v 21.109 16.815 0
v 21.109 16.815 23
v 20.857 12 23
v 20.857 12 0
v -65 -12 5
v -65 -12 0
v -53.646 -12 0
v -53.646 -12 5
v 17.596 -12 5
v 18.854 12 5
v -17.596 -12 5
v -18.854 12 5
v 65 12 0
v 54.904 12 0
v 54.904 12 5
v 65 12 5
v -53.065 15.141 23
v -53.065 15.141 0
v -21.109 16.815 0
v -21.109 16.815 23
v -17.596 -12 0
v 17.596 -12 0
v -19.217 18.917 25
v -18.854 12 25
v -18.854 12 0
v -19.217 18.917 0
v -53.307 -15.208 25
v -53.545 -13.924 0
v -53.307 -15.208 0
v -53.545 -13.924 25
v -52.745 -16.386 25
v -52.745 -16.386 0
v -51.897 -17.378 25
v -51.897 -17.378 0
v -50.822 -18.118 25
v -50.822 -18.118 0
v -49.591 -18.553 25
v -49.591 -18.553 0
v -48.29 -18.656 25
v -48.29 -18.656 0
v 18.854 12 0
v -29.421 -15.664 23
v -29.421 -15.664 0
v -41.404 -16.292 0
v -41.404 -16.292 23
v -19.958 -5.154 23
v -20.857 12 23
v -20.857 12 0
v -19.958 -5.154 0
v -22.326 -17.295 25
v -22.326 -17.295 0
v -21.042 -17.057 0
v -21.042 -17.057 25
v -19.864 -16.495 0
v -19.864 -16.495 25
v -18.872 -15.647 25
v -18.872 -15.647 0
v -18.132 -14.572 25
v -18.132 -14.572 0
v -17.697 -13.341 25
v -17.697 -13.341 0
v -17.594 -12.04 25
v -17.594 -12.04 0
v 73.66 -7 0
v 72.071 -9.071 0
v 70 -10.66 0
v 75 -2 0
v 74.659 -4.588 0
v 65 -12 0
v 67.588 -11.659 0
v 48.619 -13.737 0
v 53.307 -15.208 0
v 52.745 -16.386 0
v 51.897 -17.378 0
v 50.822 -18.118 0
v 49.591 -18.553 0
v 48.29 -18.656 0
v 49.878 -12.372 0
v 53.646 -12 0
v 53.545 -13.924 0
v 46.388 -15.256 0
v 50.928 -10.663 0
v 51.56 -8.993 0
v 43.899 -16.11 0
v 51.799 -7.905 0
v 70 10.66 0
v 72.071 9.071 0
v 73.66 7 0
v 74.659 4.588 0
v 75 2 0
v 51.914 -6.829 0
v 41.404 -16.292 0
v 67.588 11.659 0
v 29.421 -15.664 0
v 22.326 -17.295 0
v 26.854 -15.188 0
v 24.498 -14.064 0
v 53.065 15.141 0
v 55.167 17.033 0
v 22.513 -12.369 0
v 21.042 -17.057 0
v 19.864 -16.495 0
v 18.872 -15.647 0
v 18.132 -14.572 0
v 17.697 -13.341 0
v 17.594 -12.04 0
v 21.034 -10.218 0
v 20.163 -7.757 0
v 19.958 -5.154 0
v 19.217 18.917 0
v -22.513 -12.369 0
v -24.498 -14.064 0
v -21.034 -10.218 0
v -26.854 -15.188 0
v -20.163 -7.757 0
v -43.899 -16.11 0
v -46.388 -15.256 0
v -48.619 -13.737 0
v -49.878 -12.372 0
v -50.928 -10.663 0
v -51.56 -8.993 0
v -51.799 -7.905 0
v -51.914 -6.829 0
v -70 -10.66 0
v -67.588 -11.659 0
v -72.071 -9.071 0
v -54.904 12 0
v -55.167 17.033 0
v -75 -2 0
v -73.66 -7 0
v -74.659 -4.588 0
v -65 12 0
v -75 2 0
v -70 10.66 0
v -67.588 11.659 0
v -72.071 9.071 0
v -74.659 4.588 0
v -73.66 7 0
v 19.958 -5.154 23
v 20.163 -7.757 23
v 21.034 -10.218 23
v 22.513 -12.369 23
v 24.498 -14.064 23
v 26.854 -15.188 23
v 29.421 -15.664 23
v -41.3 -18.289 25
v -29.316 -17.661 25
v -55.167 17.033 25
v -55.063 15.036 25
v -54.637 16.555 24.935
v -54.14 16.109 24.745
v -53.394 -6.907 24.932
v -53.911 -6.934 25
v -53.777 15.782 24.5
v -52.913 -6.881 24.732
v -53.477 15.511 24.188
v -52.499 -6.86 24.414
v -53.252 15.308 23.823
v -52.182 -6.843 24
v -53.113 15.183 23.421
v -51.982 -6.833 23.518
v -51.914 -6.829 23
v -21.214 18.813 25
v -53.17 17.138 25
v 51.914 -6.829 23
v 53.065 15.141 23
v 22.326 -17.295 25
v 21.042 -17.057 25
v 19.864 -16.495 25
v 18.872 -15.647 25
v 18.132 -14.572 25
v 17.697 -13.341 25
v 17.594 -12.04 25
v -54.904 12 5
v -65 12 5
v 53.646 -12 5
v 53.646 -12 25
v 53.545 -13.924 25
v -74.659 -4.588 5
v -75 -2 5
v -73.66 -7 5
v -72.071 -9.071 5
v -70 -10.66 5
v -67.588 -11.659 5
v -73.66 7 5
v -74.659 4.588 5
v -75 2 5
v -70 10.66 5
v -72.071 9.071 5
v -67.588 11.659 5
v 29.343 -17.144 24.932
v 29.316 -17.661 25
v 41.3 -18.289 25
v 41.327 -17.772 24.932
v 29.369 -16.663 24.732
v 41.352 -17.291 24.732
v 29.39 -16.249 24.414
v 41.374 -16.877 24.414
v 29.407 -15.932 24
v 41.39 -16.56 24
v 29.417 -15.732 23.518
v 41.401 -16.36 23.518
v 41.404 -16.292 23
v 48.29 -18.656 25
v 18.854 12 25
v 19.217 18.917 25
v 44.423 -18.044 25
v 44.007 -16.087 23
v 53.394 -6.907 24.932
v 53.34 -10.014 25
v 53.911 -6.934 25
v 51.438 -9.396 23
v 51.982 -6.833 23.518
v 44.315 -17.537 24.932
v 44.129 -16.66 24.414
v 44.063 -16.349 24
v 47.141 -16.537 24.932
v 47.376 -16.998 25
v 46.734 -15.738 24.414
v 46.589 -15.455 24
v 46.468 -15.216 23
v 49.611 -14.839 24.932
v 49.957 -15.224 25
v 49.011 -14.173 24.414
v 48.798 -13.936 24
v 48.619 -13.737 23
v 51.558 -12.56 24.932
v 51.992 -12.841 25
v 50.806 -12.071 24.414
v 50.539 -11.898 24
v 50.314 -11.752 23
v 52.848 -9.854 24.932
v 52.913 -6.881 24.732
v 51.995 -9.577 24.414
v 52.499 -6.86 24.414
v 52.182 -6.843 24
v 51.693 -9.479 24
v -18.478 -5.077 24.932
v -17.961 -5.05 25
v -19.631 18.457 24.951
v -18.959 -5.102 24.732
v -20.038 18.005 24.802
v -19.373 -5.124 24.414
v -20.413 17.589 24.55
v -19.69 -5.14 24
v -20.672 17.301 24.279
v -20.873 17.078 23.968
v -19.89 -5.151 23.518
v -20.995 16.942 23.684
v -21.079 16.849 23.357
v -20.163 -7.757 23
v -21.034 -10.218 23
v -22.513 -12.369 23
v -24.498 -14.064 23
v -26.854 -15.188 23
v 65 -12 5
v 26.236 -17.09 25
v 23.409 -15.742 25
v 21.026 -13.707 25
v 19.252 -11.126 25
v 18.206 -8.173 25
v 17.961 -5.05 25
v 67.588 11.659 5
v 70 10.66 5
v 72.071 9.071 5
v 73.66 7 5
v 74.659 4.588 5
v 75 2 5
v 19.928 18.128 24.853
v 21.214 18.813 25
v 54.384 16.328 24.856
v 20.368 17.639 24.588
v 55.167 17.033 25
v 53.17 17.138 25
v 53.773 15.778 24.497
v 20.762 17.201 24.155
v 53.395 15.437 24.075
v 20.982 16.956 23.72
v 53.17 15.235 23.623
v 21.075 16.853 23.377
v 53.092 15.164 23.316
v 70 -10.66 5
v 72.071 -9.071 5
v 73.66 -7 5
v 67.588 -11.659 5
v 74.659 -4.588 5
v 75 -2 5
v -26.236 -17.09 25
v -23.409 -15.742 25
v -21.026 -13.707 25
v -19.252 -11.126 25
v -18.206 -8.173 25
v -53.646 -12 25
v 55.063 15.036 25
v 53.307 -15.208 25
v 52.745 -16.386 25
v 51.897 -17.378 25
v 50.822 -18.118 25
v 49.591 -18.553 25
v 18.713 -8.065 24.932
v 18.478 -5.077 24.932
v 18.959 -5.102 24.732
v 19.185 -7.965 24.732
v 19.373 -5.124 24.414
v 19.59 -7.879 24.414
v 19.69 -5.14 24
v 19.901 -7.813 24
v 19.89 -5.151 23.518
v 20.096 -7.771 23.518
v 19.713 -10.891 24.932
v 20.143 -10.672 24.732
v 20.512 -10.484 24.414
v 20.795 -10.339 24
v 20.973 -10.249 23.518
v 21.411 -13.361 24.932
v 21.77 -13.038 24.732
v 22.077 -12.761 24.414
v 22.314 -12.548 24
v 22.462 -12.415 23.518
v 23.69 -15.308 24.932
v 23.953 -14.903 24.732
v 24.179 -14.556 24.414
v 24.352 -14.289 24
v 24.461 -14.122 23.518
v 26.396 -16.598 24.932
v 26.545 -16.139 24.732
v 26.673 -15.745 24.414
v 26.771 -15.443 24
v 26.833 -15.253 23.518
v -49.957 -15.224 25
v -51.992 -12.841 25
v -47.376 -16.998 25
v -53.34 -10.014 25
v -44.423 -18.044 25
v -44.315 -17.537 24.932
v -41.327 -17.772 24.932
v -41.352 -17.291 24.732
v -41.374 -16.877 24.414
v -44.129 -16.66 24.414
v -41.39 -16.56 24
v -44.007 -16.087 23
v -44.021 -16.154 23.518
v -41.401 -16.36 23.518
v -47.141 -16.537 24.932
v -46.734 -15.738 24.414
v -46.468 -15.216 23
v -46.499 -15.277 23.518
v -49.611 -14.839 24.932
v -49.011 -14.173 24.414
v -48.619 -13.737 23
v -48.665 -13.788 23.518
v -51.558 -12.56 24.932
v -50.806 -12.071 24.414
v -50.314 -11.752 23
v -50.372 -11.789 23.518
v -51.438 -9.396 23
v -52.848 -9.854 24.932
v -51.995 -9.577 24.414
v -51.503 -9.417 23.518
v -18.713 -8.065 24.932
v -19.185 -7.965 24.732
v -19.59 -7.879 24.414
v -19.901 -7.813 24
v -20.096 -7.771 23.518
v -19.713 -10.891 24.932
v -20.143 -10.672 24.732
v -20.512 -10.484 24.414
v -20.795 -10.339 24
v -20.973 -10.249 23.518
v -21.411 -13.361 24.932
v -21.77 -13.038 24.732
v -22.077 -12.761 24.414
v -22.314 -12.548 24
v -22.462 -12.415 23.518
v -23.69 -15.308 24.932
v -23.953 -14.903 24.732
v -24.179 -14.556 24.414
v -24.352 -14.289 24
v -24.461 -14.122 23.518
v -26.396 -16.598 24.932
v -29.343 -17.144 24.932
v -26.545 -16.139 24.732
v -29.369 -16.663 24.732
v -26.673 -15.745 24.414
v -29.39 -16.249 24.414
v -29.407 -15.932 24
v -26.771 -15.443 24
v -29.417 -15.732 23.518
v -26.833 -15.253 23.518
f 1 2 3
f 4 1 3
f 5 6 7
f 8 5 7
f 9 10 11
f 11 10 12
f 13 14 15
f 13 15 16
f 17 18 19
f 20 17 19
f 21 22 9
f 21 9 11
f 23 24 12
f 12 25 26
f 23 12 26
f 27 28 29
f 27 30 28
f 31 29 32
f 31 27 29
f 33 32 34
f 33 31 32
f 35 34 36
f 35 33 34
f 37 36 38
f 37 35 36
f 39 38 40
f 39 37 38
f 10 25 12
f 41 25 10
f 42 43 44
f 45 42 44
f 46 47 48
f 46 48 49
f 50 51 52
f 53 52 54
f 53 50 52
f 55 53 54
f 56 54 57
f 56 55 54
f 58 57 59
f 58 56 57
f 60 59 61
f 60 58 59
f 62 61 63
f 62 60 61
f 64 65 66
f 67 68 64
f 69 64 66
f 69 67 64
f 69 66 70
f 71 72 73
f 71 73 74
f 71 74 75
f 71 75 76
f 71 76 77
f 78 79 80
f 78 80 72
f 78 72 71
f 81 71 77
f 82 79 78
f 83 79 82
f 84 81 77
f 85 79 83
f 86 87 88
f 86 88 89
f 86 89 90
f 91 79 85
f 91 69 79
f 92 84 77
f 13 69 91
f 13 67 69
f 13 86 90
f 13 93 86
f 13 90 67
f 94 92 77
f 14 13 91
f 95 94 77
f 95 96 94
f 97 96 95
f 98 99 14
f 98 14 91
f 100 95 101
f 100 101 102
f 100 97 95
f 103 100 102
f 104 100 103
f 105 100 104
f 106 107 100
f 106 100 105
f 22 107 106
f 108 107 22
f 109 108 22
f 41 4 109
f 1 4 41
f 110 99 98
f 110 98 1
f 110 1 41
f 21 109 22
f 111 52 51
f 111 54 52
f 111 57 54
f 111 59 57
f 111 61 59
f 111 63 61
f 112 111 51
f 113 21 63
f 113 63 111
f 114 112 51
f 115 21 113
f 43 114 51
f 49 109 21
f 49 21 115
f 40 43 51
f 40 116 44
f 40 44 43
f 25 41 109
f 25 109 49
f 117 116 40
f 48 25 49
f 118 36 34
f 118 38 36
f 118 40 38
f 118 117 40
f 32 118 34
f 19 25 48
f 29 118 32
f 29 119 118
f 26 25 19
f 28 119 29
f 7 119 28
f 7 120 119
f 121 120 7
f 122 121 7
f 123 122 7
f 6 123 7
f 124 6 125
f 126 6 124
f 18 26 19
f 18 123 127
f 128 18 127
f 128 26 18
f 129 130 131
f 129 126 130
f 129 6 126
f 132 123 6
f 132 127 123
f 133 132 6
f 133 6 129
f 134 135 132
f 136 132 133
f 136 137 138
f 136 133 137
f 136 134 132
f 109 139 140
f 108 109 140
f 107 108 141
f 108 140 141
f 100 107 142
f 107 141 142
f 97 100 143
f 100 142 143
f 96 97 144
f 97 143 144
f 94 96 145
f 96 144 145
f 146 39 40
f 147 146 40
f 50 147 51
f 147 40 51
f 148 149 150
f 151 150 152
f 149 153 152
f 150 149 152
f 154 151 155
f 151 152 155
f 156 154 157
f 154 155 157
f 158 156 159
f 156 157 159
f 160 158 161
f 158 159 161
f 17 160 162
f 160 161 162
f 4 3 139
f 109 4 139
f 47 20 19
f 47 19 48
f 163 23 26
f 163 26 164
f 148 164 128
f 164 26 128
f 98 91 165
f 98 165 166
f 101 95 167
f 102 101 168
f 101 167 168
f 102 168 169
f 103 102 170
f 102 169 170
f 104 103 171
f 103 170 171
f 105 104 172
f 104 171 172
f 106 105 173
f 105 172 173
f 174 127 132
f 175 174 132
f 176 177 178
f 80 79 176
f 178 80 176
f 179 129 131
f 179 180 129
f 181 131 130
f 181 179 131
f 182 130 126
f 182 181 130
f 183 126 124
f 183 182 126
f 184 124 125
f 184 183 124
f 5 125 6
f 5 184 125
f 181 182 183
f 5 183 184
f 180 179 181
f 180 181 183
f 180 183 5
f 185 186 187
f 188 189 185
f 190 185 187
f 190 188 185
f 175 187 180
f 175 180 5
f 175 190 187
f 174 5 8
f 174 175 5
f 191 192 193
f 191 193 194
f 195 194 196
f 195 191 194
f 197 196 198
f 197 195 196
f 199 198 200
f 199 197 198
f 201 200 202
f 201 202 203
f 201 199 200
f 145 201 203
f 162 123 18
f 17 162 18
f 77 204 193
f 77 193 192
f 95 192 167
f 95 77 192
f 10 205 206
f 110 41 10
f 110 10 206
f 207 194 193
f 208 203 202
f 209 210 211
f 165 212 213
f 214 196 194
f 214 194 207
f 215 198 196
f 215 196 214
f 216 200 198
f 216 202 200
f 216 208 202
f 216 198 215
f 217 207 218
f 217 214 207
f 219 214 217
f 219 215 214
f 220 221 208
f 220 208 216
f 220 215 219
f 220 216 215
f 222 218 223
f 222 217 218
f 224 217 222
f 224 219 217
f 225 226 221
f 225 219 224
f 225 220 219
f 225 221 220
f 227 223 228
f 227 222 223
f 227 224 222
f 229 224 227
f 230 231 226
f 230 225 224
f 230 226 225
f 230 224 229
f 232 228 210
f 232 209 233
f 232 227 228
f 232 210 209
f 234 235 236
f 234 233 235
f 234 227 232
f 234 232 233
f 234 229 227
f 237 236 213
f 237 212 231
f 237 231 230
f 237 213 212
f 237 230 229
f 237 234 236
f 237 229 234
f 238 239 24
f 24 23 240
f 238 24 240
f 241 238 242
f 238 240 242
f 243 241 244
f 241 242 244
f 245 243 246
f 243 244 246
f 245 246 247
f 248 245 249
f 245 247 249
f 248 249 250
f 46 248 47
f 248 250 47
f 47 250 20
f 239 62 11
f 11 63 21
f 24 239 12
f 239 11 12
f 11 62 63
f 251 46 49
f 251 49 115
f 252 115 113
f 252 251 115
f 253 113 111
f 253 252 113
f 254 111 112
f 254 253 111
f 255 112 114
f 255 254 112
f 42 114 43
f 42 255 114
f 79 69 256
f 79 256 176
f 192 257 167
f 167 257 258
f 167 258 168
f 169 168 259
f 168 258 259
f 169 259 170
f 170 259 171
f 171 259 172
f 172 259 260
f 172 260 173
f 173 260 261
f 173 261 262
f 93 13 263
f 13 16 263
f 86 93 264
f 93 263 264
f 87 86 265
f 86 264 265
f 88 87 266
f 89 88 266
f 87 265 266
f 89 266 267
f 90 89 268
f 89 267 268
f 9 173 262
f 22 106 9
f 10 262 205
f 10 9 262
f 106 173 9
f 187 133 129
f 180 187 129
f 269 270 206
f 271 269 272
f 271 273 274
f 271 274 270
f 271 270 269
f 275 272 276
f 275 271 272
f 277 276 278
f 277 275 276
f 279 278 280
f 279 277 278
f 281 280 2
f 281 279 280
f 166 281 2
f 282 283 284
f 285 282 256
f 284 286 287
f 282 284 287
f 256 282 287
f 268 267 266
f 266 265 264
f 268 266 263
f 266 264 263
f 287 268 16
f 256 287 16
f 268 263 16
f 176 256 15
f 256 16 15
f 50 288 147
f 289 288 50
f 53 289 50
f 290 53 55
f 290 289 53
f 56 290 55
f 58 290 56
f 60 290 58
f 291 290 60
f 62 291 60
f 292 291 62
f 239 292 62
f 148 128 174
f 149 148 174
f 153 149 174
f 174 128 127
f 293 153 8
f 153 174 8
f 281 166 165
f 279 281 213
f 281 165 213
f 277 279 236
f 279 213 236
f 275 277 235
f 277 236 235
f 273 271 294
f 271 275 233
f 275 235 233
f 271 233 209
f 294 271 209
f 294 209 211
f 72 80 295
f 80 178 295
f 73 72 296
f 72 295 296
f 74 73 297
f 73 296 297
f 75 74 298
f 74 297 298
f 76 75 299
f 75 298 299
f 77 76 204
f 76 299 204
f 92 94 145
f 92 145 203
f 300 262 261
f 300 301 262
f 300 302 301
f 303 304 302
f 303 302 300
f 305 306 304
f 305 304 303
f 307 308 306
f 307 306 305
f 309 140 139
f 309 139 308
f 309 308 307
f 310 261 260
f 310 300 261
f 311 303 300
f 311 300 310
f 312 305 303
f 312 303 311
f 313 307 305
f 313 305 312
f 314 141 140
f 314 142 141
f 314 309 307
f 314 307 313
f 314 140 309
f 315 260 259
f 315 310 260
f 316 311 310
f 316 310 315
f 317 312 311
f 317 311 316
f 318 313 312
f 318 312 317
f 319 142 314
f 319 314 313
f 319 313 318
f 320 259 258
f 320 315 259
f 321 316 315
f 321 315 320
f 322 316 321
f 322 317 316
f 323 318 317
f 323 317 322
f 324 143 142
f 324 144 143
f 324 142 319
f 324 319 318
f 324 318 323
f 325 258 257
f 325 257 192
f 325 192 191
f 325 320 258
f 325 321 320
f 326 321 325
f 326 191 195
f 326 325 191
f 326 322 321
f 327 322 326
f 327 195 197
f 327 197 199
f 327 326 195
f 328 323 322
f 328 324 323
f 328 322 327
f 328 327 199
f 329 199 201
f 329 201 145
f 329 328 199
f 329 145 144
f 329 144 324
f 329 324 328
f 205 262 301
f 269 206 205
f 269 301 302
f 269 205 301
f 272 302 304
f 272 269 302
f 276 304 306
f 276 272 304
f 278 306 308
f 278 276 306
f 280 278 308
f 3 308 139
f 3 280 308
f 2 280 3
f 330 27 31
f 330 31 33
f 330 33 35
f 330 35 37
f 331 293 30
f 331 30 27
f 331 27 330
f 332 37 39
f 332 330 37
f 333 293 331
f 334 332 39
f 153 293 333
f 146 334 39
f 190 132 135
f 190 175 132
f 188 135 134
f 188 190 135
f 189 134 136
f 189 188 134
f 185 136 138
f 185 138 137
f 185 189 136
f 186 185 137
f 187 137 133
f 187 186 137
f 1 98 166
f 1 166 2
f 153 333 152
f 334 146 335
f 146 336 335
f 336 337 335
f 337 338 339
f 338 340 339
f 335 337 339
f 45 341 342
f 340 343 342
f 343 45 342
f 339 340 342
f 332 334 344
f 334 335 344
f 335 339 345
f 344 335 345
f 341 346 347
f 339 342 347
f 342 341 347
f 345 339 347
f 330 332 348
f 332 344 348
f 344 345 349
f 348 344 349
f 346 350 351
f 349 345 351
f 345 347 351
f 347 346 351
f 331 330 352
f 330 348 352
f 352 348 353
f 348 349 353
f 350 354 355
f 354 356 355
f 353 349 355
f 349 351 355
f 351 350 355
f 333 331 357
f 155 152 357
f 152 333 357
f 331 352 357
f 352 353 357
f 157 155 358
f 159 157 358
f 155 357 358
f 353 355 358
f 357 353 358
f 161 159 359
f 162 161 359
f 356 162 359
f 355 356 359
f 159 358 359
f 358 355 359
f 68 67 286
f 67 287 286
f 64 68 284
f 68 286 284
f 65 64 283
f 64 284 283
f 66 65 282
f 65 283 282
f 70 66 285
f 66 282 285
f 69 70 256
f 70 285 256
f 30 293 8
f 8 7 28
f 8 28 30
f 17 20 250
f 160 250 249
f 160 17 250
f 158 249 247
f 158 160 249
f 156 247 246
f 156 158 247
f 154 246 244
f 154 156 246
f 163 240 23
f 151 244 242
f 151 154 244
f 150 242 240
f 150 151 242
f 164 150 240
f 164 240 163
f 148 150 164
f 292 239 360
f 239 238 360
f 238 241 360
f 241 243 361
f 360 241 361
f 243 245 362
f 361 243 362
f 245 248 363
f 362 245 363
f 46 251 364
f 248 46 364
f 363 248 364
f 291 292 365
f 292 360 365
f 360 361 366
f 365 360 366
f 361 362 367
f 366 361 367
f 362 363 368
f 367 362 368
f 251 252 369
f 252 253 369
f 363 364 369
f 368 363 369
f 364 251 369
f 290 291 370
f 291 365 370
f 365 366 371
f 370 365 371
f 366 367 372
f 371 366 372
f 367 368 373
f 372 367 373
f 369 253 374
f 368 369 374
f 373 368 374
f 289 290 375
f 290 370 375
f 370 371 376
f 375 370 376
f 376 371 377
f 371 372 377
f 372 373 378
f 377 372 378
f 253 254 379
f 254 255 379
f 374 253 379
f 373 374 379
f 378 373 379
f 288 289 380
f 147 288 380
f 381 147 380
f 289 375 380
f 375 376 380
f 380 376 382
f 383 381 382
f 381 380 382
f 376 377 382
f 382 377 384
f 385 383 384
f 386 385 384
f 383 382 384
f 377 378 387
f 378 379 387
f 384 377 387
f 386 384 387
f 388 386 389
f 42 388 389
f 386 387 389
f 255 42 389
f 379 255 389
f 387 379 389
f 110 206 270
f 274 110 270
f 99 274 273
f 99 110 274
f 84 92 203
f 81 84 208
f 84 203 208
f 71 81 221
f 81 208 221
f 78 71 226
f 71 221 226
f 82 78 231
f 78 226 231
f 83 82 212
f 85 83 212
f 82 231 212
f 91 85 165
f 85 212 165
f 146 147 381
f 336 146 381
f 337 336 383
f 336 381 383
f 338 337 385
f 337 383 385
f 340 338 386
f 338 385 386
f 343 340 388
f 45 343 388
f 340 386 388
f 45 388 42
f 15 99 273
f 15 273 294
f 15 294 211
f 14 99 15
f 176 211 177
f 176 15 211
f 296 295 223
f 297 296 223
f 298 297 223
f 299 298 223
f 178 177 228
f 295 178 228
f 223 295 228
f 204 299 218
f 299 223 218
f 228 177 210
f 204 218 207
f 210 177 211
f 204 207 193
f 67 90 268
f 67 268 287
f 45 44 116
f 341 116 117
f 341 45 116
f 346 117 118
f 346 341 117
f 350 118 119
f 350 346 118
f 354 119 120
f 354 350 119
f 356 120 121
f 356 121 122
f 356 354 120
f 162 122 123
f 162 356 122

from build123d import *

# Parameters (mm, degrees)
F1_DEPTH     = 25
F2_DEPTH     = 5
F3_R         = 10
F4_R         = 5
F6_T1_DEPTH  = 22
F6_T3_DEPTH  = 32
F6_T5_DEPTH  = 32
F6_T7_DEPTH  = 22
F6_T9_DEPTH  = 22
F6_T11_DEPTH = 12
F6_T13_DEPTH = 22
F6_T15_DEPTH = 12
F6_T18_ANGLE = 90
F6_T20_ANGLE = 90
F6_T22_ANGLE = 90
F6_T24_ANGLE = 90
F6_T29_DEPTH = 37
F6_T34_DEPTH = 27
F6_T42_DEPTH = 37
F6_T47_DEPTH = 27
F6_T55_DEPTH = 27
F6_T60_DEPTH = 37
F6_T68_DEPTH = 27
F6_T73_DEPTH = 37


# Not quite as in the source:
# - a fillet or chamfer that OpenCascade refuses, or shapes differently, is made with other operations: its cross-section is extruded or revolved along the edge and cut away or added
# - a feature names something its author has since deleted; it is built from what else it names


with BuildPart() as f1:
    # F0 (on Top) → F1 (new body)
    with BuildSketch(Plane.XY):
        Polygon((-52.9008508874, 12), (-53.065447856, 15.1406972562), (-21.1093027438, 16.815447856), (-20.8569358154, 12), (-18.8541911234, 12), (-19.2167155868, 18.917378838), (-55.167378838, 17.0332844132), (-54.9035955794, 12), align=None)
        Polygon((-51.6430641846, -12), (-52.9008508874, 12), (-54.9035955794, 12), (-53.6458088766, -12), align=None)
        Polygon((-18.8541911234, 12), (-20.8569358154, 12), (-19.5991491126, -12), (-17.5964044206, -12), align=None)
        Polygon((-51.3906972562, -16.815447856), (-51.6430641846, -12), (-53.6458088766, -12), (-53.2832844132, -18.917378838), (-17.332621162, -17.0332844132), (-17.5964044206, -12), (-19.5991491126, -12), (-19.434552144, -15.1406972562), align=None)
    extrude(amount=F1_DEPTH)

    # F0 (on Top) → F2 (join)
    with BuildSketch(Plane.XY):
        Polygon((-53.6458088766, -12), (-54.9035955794, 12), (-75, 12), (-75, -12), align=None)
        Polygon((0, 12), (-18.8541911234, 12), (-17.5964044206, -12), (0, -12), align=None)
    extrude(amount=F2_DEPTH)

    # F3
    f3_edges = [f1.edges().sort_by_distance(p)[0] for p in [
        (-75, -12, 2.5),
        (-75, 12, 2.5),
        (-51.390697, -16.815448, 12.5),
        (-19.434552, -15.140697, 12.5),
    ]]
    fillet(f3_edges, radius=F3_R)

    # F4
    f4_edges = [f1.edges().sort_by_distance(p)[0] for p in [
        (-53.283284, -18.917379, 12.5),
        (-17.332621, -17.033284, 12.5),
    ]]
    fillet(f4_edges, radius=F4_R)

    # F5: F1 across plane


with BuildPart() as f1_1:
    add(f1.part)
    add(f1.part.mirror(Plane.YZ))

    # F6: fillet of radius 2 on 12 edges, made by hand

    # F6_s2 → F6_t1 (cut)
    with BuildSketch(Plane(origin=(0.214725091, -4.0971988118, 0), x_dir=(0, 0, 1), z_dir=(-0.0523359562, 0.9986295348, 0))):
        with BuildLine():
            ThreePointArc((25, -54.2003206349), (24.4142135624, -52.7861070725), (23, -52.2003206349))
            Line((23, -52.2003206349), (25, -52.2003206349))
            Line((25, -52.2003206349), (25, -54.2003206349))
        make_face()
    extrude(amount=F6_T1_DEPTH, mode=Mode.SUBTRACT)

    # F6_s4 → F6_t3 (cut)
    with BuildSketch(Plane(origin=(-52.1287819096, -2.7319536966, 0), x_dir=(0, 0, 1), z_dir=(0.9986295348, 0.0523359562, 0))):
        with BuildLine():
            ThreePointArc((23, -17.8971784138), (24.4142135624, -18.4829648514), (25, -19.8971784138))
            Line((25, -19.8971784138), (25, -17.8971784138))
            Line((25, -17.8971784138), (23, -17.8971784138))
        make_face()
    extrude(amount=F6_T3_DEPTH, mode=Mode.SUBTRACT)

    # F6_s6 → F6_t5 (cut)
    with BuildSketch(Plane(origin=(52.1287819096, -2.7319536966, 0), x_dir=(0, 0, 1), z_dir=(-0.9986295348, 0.0523359562, 0))):
        with BuildLine():
            ThreePointArc((25, 19.8971784138), (24.4142135624, 18.4829648514), (23, 17.8971784138))
            Line((23, 17.8971784138), (25, 17.8971784138))
            Line((25, 17.8971784138), (25, 19.8971784138))
        make_face()
    extrude(amount=F6_T5_DEPTH, mode=Mode.SUBTRACT)

    # F6_s8 → F6_t7 (cut)
    with BuildSketch(Plane(origin=(-0.214725091, -4.0971988118, 0), x_dir=(0, 0, 1), z_dir=(0.0523359562, 0.9986295348, 0))):
        with BuildLine():
            ThreePointArc((23, 52.2003206349), (24.4142135624, 52.7861070725), (25, 54.2003206349))
            Line((25, 54.2003206349), (25, 52.2003206349))
            Line((25, 52.2003206349), (23, 52.2003206349))
        make_face()
    extrude(amount=F6_T7_DEPTH, mode=Mode.SUBTRACT)

    # F6_s10 → F6_t9 (cut)
    with BuildSketch(Plane(origin=(0.9366659463, 17.8726509528, 0), x_dir=(0, 0, 1), z_dir=(-0.0523359562, -0.9986295348, 0))):
        with BuildLine():
            ThreePointArc((25, -18.2003206349), (24.4142135624, -19.6145341972), (23, -20.2003206349))
            Line((23, -20.2003206349), (25, -20.2003206349))
            Line((25, -20.2003206349), (25, -18.2003206349))
        make_face()
    extrude(amount=F6_T9_DEPTH, mode=Mode.SUBTRACT)

    # F6_s12 → F6_t11 (cut)
    with BuildSketch(Plane(origin=(30.158932145, -1.5805626593, 0), x_dir=(0, 0, 1), z_dir=(0.9986295348, -0.0523359562, 0))):
        with BuildLine():
            ThreePointArc((25, 16.1028215862), (24.4142135624, 14.6886080238), (23, 14.1028215862))
            Line((23, 14.1028215862), (25, 14.1028215862))
            Line((25, 14.1028215862), (25, 16.1028215862))
        make_face()
    extrude(amount=F6_T11_DEPTH, mode=Mode.SUBTRACT)

    # F6_s14 → F6_t13 (cut)
    with BuildSketch(Plane(origin=(-0.9366659463, 17.8726509528, 0), x_dir=(0, 0, 1), z_dir=(0.0523359562, -0.9986295348, 0))):
        with BuildLine():
            ThreePointArc((25, 18.2003206349), (24.4142135624, 19.6145341972), (23, 20.2003206349))
            Line((23, 20.2003206349), (25, 20.2003206349))
            Line((25, 20.2003206349), (25, 18.2003206349))
        make_face()
    extrude(amount=F6_T13_DEPTH, mode=Mode.SUBTRACT)

    # F6_s16 → F6_t15 (cut)
    with BuildSketch(Plane(origin=(-30.158932145, -1.5805626593, 0), x_dir=(0, 0, 1), z_dir=(-0.9986295348, -0.0523359562, 0))):
        with BuildLine():
            ThreePointArc((25, -16.1028215862), (24.4142135624, -14.6886080238), (23, -14.1028215862))
            Line((23, -14.1028215862), (25, -14.1028215862))
            Line((25, -14.1028215862), (25, -16.1028215862))
        make_face()
    extrude(amount=F6_T15_DEPTH, mode=Mode.SUBTRACT)

    # F6_s17 → F6_t18 (revolve, cut)
    with BuildSketch(Plane(origin=(-42.1424865621, -2.2085941342, 0), x_dir=(0, 0, 1), z_dir=(0.9986295348, 0.0523359562, 0))):
        with BuildLine():
            ThreePointArc((25, 16.1028215862), (24.4142135624, 14.6886080238), (23, 14.1028215862))
            Line((23, 14.1028215862), (25, 14.1028215862))
            Line((25, 14.1028215862), (25, 16.1028215862))
        make_face()
    revolve(axis=Axis((-41.9277614711, -6.305792946, 25), (0, 0, -1)), revolution_arc=F6_T18_ANGLE, mode=Mode.SUBTRACT)

    # F6_s19 → F6_t20 (revolve, cut)
    with BuildSketch(Plane(origin=(-0.214725091, -4.0971988118, 0), x_dir=(0, 0, 1), z_dir=(0.0523359562, 0.9986295348, 0))):
        with BuildLine():
            ThreePointArc((25, 18.2003206349), (24.4142135624, 19.6145341972), (23, 20.2003206349))
            Line((23, 20.2003206349), (25, 20.2003206349))
            Line((25, 20.2003206349), (25, 18.2003206349))
        make_face()
    revolve(axis=Axis((29.944207054, -5.6777614711, 25), (0, 0, 1)), revolution_arc=F6_T20_ANGLE, mode=Mode.SUBTRACT)

    # F6_s21 → F6_t22 (revolve, cut)
    with BuildSketch(Plane(origin=(42.1424865621, -2.2085941342, 0), x_dir=(0, 0, 1), z_dir=(-0.9986295348, 0.0523359562, 0))):
        with BuildLine():
            ThreePointArc((25, -16.1028215862), (24.4142135624, -14.6886080238), (23, -14.1028215862))
            Line((23, -14.1028215862), (25, -14.1028215862))
            Line((25, -14.1028215862), (25, -16.1028215862))
        make_face()
    revolve(axis=Axis((41.9277614711, -6.305792946, 25), (0, 0, 1)), revolution_arc=F6_T22_ANGLE, mode=Mode.SUBTRACT)

    # F6_s23 → F6_t24 (revolve, cut)
    with BuildSketch(Plane(origin=(0.214725091, -4.0971988118, 0), x_dir=(0, 0, 1), z_dir=(-0.0523359562, 0.9986295348, 0))):
        with BuildLine():
            ThreePointArc((25, -18.2003206349), (24.4142135624, -19.6145341972), (23, -20.2003206349))
            Line((23, -20.2003206349), (25, -20.2003206349))
            Line((25, -20.2003206349), (25, -18.2003206349))
        make_face()
    revolve(axis=Axis((-29.944207054, -5.6777614711, 25), (0, 0, -1)), revolution_arc=F6_T24_ANGLE, mode=Mode.SUBTRACT)


with BuildPart() as f6_tool27:
    # F6_s28 → F6_t29 (new body)
    with BuildSketch(Plane(origin=(-57.1219295834, -2.9936334778, 0), x_dir=(0, 0, 1), z_dir=(0.9986295348, 0.0523359562, 0))):
        with BuildLine():
            ThreePointArc((23, -17.8971784138), (24.4142135624, -18.4829648514), (25, -19.8971784138))
            Line((25, -19.8971784138), (25, -17.8971784138))
            Line((25, -17.8971784138), (23, -17.8971784138))
        make_face()
    extrude(amount=F6_T29_DEPTH)

    split(bisect_by=Plane(origin=(-52.1287819096, -2.7319536966, 0), x_dir=(0, 0, 1), z_dir=(-0.9986295348, -0.0523359562, 0)), keep=Keep.TOP)

    split(bisect_by=Plane(origin=(-54.1260409791, -2.8366256091, 0), x_dir=(0, 0, 1), z_dir=(0.9986295348, 0.0523359562, 0)), keep=Keep.TOP)


with BuildPart() as f6_tool32:
    # F6_s33 → F6_t34 (new body)
    with BuildSketch(Plane(origin=(0.214725091, -4.0971988118, 0), x_dir=(0, 0, 1), z_dir=(-0.0523359562, 0.9986295348, 0))):
        with BuildLine():
            ThreePointArc((25, -54.2003206349), (24.4142135624, -52.7861070725), (23, -52.2003206349))
            Line((23, -52.2003206349), (25, -52.2003206349))
            Line((25, -52.2003206349), (25, -54.2003206349))
        make_face()
    extrude(amount=F6_T34_DEPTH)

    split(bisect_by=Plane(origin=(-0.9366659463, 17.8726509528, 0), x_dir=(0, 0, 1), z_dir=(-0.0523359562, 0.9986295348, 0)), keep=Keep.TOP)

    split(bisect_by=Plane(origin=(-1.0413378588, 19.8699100223, 0), x_dir=(0, 0, 1), z_dir=(0.0523359562, -0.9986295348, 0)), keep=Keep.TOP)


with BuildPart() as f6_tool27_1:
    add(f6_tool27.part)

    # F6_t37: intersect F6_tool32
    add(f6_tool32.part, mode=Mode.INTERSECT)


with BuildPart() as f1_2:
    add(f1_1.part)

    # F6_t25: cut F6_tool27
    add(f6_tool27_1.part, mode=Mode.SUBTRACT)


with BuildPart() as f6_tool40:
    # F6_s41 → F6_t42 (new body)
    with BuildSketch(Plane(origin=(-52.1287819096, -2.7319536966, 0), x_dir=(0, 0, 1), z_dir=(0.9986295348, 0.0523359562, 0))):
        with BuildLine():
            ThreePointArc((23, -17.8971784138), (24.4142135624, -18.4829648514), (25, -19.8971784138))
            Line((25, -19.8971784138), (25, -17.8971784138))
            Line((25, -17.8971784138), (23, -17.8971784138))
        make_face()
    extrude(amount=F6_T42_DEPTH)

    split(bisect_by=Plane(origin=(-20.1726367975, -1.0572030968, 0), x_dir=(0, 0, 1), z_dir=(0.9986295348, 0.0523359562, 0)), keep=Keep.TOP)

    split(bisect_by=Plane(origin=(-18.175377728, -0.9525311844, 0), x_dir=(0, 0, 1), z_dir=(-0.9986295348, -0.0523359562, 0)), keep=Keep.TOP)


with BuildPart() as f6_tool45:
    # F6_s46 → F6_t47 (new body)
    with BuildSketch(Plane(origin=(-1.1983457276, 22.8657986266, 0), x_dir=(0, 0, 1), z_dir=(0.0523359562, -0.9986295348, 0))):
        with BuildLine():
            ThreePointArc((25, 18.2003206349), (24.4142135624, 19.6145341972), (23, 20.2003206349))
            Line((23, 20.2003206349), (25, 20.2003206349))
            Line((25, 20.2003206349), (25, 18.2003206349))
        make_face()
    extrude(amount=F6_T47_DEPTH)

    split(bisect_by=Plane(origin=(-0.9366659463, 17.8726509528, 0), x_dir=(0, 0, 1), z_dir=(-0.0523359562, 0.9986295348, 0)), keep=Keep.TOP)

    split(bisect_by=Plane(origin=(-1.0413378588, 19.8699100223, 0), x_dir=(0, 0, 1), z_dir=(0.0523359562, -0.9986295348, 0)), keep=Keep.TOP)


with BuildPart() as f6_tool40_1:
    add(f6_tool40.part)

    # F6_t50: intersect F6_tool45
    add(f6_tool45.part, mode=Mode.INTERSECT)


with BuildPart() as f1_3:
    add(f1_2.part)

    # F6_t38: cut F6_tool40
    add(f6_tool40_1.part, mode=Mode.SUBTRACT)


with BuildPart() as f6_tool53:
    # F6_s54 → F6_t55 (new body)
    with BuildSketch(Plane(origin=(-0.214725091, -4.0971988118, 0), x_dir=(0, 0, 1), z_dir=(0.0523359562, 0.9986295348, 0))):
        with BuildLine():
            ThreePointArc((23, 52.2003206349), (24.4142135624, 52.7861070725), (25, 54.2003206349))
            Line((25, 54.2003206349), (25, 52.2003206349))
            Line((25, 52.2003206349), (23, 52.2003206349))
        make_face()
    extrude(amount=F6_T55_DEPTH)

    split(bisect_by=Plane(origin=(0.9366659463, 17.8726509528, 0), x_dir=(0, 0, 1), z_dir=(0.0523359562, 0.9986295348, 0)), keep=Keep.TOP)

    split(bisect_by=Plane(origin=(1.0413378588, 19.8699100223, 0), x_dir=(0, 0, 1), z_dir=(-0.0523359562, -0.9986295348, 0)), keep=Keep.TOP)


with BuildPart() as f6_tool58:
    # F6_s59 → F6_t60 (new body)
    with BuildSketch(Plane(origin=(57.1219295834, -2.9936334778, 0), x_dir=(0, 0, 1), z_dir=(-0.9986295348, 0.0523359562, 0))):
        with BuildLine():
            ThreePointArc((25, 19.8971784138), (24.4142135624, 18.4829648514), (23, 17.8971784138))
            Line((23, 17.8971784138), (25, 17.8971784138))
            Line((25, 17.8971784138), (25, 19.8971784138))
        make_face()
    extrude(amount=F6_T60_DEPTH)

    split(bisect_by=Plane(origin=(52.1287819096, -2.7319536966, 0), x_dir=(0, 0, 1), z_dir=(0.9986295348, -0.0523359562, 0)), keep=Keep.TOP)

    split(bisect_by=Plane(origin=(54.1260409791, -2.8366256091, 0), x_dir=(0, 0, 1), z_dir=(-0.9986295348, 0.0523359562, 0)), keep=Keep.TOP)


with BuildPart() as f6_tool53_1:
    add(f6_tool53.part)

    # F6_t63: intersect F6_tool58
    add(f6_tool58.part, mode=Mode.INTERSECT)


with BuildPart() as f1_4:
    add(f1_3.part)

    # F6_t51: cut F6_tool53
    add(f6_tool53_1.part, mode=Mode.SUBTRACT)


with BuildPart() as f6_tool66:
    # F6_s67 → F6_t68 (new body)
    with BuildSketch(Plane(origin=(1.1983457276, 22.8657986266, 0), x_dir=(0, 0, 1), z_dir=(-0.0523359562, -0.9986295348, 0))):
        with BuildLine():
            ThreePointArc((25, -18.2003206349), (24.4142135624, -19.6145341972), (23, -20.2003206349))
            Line((23, -20.2003206349), (25, -20.2003206349))
            Line((25, -20.2003206349), (25, -18.2003206349))
        make_face()
    extrude(amount=F6_T68_DEPTH)

    split(bisect_by=Plane(origin=(0.9366659463, 17.8726509528, 0), x_dir=(0, 0, 1), z_dir=(0.0523359562, 0.9986295348, 0)), keep=Keep.TOP)

    split(bisect_by=Plane(origin=(1.0413378588, 19.8699100223, 0), x_dir=(0, 0, 1), z_dir=(-0.0523359562, -0.9986295348, 0)), keep=Keep.TOP)


with BuildPart() as f6_tool71:
    # F6_s72 → F6_t73 (new body)
    with BuildSketch(Plane(origin=(52.1287819096, -2.7319536966, 0), x_dir=(0, 0, 1), z_dir=(-0.9986295348, 0.0523359562, 0))):
        with BuildLine():
            ThreePointArc((25, 19.8971784138), (24.4142135624, 18.4829648514), (23, 17.8971784138))
            Line((23, 17.8971784138), (25, 17.8971784138))
            Line((25, 17.8971784138), (25, 19.8971784138))
        make_face()
    extrude(amount=F6_T73_DEPTH)

    split(bisect_by=Plane(origin=(20.1726367975, -1.0572030968, 0), x_dir=(0, 0, 1), z_dir=(-0.9986295348, 0.0523359562, 0)), keep=Keep.TOP)

    split(bisect_by=Plane(origin=(18.175377728, -0.9525311844, 0), x_dir=(0, 0, 1), z_dir=(0.9986295348, -0.0523359562, 0)), keep=Keep.TOP)


with BuildPart() as f6_tool66_1:
    add(f6_tool66.part)

    # F6_t76: intersect F6_tool71
    add(f6_tool71.part, mode=Mode.INTERSECT)


with BuildPart() as f1_5:
    add(f1_4.part)

    # F6_t64: cut F6_tool66
    add(f6_tool66_1.part, mode=Mode.SUBTRACT)


solid = f1_5.part
